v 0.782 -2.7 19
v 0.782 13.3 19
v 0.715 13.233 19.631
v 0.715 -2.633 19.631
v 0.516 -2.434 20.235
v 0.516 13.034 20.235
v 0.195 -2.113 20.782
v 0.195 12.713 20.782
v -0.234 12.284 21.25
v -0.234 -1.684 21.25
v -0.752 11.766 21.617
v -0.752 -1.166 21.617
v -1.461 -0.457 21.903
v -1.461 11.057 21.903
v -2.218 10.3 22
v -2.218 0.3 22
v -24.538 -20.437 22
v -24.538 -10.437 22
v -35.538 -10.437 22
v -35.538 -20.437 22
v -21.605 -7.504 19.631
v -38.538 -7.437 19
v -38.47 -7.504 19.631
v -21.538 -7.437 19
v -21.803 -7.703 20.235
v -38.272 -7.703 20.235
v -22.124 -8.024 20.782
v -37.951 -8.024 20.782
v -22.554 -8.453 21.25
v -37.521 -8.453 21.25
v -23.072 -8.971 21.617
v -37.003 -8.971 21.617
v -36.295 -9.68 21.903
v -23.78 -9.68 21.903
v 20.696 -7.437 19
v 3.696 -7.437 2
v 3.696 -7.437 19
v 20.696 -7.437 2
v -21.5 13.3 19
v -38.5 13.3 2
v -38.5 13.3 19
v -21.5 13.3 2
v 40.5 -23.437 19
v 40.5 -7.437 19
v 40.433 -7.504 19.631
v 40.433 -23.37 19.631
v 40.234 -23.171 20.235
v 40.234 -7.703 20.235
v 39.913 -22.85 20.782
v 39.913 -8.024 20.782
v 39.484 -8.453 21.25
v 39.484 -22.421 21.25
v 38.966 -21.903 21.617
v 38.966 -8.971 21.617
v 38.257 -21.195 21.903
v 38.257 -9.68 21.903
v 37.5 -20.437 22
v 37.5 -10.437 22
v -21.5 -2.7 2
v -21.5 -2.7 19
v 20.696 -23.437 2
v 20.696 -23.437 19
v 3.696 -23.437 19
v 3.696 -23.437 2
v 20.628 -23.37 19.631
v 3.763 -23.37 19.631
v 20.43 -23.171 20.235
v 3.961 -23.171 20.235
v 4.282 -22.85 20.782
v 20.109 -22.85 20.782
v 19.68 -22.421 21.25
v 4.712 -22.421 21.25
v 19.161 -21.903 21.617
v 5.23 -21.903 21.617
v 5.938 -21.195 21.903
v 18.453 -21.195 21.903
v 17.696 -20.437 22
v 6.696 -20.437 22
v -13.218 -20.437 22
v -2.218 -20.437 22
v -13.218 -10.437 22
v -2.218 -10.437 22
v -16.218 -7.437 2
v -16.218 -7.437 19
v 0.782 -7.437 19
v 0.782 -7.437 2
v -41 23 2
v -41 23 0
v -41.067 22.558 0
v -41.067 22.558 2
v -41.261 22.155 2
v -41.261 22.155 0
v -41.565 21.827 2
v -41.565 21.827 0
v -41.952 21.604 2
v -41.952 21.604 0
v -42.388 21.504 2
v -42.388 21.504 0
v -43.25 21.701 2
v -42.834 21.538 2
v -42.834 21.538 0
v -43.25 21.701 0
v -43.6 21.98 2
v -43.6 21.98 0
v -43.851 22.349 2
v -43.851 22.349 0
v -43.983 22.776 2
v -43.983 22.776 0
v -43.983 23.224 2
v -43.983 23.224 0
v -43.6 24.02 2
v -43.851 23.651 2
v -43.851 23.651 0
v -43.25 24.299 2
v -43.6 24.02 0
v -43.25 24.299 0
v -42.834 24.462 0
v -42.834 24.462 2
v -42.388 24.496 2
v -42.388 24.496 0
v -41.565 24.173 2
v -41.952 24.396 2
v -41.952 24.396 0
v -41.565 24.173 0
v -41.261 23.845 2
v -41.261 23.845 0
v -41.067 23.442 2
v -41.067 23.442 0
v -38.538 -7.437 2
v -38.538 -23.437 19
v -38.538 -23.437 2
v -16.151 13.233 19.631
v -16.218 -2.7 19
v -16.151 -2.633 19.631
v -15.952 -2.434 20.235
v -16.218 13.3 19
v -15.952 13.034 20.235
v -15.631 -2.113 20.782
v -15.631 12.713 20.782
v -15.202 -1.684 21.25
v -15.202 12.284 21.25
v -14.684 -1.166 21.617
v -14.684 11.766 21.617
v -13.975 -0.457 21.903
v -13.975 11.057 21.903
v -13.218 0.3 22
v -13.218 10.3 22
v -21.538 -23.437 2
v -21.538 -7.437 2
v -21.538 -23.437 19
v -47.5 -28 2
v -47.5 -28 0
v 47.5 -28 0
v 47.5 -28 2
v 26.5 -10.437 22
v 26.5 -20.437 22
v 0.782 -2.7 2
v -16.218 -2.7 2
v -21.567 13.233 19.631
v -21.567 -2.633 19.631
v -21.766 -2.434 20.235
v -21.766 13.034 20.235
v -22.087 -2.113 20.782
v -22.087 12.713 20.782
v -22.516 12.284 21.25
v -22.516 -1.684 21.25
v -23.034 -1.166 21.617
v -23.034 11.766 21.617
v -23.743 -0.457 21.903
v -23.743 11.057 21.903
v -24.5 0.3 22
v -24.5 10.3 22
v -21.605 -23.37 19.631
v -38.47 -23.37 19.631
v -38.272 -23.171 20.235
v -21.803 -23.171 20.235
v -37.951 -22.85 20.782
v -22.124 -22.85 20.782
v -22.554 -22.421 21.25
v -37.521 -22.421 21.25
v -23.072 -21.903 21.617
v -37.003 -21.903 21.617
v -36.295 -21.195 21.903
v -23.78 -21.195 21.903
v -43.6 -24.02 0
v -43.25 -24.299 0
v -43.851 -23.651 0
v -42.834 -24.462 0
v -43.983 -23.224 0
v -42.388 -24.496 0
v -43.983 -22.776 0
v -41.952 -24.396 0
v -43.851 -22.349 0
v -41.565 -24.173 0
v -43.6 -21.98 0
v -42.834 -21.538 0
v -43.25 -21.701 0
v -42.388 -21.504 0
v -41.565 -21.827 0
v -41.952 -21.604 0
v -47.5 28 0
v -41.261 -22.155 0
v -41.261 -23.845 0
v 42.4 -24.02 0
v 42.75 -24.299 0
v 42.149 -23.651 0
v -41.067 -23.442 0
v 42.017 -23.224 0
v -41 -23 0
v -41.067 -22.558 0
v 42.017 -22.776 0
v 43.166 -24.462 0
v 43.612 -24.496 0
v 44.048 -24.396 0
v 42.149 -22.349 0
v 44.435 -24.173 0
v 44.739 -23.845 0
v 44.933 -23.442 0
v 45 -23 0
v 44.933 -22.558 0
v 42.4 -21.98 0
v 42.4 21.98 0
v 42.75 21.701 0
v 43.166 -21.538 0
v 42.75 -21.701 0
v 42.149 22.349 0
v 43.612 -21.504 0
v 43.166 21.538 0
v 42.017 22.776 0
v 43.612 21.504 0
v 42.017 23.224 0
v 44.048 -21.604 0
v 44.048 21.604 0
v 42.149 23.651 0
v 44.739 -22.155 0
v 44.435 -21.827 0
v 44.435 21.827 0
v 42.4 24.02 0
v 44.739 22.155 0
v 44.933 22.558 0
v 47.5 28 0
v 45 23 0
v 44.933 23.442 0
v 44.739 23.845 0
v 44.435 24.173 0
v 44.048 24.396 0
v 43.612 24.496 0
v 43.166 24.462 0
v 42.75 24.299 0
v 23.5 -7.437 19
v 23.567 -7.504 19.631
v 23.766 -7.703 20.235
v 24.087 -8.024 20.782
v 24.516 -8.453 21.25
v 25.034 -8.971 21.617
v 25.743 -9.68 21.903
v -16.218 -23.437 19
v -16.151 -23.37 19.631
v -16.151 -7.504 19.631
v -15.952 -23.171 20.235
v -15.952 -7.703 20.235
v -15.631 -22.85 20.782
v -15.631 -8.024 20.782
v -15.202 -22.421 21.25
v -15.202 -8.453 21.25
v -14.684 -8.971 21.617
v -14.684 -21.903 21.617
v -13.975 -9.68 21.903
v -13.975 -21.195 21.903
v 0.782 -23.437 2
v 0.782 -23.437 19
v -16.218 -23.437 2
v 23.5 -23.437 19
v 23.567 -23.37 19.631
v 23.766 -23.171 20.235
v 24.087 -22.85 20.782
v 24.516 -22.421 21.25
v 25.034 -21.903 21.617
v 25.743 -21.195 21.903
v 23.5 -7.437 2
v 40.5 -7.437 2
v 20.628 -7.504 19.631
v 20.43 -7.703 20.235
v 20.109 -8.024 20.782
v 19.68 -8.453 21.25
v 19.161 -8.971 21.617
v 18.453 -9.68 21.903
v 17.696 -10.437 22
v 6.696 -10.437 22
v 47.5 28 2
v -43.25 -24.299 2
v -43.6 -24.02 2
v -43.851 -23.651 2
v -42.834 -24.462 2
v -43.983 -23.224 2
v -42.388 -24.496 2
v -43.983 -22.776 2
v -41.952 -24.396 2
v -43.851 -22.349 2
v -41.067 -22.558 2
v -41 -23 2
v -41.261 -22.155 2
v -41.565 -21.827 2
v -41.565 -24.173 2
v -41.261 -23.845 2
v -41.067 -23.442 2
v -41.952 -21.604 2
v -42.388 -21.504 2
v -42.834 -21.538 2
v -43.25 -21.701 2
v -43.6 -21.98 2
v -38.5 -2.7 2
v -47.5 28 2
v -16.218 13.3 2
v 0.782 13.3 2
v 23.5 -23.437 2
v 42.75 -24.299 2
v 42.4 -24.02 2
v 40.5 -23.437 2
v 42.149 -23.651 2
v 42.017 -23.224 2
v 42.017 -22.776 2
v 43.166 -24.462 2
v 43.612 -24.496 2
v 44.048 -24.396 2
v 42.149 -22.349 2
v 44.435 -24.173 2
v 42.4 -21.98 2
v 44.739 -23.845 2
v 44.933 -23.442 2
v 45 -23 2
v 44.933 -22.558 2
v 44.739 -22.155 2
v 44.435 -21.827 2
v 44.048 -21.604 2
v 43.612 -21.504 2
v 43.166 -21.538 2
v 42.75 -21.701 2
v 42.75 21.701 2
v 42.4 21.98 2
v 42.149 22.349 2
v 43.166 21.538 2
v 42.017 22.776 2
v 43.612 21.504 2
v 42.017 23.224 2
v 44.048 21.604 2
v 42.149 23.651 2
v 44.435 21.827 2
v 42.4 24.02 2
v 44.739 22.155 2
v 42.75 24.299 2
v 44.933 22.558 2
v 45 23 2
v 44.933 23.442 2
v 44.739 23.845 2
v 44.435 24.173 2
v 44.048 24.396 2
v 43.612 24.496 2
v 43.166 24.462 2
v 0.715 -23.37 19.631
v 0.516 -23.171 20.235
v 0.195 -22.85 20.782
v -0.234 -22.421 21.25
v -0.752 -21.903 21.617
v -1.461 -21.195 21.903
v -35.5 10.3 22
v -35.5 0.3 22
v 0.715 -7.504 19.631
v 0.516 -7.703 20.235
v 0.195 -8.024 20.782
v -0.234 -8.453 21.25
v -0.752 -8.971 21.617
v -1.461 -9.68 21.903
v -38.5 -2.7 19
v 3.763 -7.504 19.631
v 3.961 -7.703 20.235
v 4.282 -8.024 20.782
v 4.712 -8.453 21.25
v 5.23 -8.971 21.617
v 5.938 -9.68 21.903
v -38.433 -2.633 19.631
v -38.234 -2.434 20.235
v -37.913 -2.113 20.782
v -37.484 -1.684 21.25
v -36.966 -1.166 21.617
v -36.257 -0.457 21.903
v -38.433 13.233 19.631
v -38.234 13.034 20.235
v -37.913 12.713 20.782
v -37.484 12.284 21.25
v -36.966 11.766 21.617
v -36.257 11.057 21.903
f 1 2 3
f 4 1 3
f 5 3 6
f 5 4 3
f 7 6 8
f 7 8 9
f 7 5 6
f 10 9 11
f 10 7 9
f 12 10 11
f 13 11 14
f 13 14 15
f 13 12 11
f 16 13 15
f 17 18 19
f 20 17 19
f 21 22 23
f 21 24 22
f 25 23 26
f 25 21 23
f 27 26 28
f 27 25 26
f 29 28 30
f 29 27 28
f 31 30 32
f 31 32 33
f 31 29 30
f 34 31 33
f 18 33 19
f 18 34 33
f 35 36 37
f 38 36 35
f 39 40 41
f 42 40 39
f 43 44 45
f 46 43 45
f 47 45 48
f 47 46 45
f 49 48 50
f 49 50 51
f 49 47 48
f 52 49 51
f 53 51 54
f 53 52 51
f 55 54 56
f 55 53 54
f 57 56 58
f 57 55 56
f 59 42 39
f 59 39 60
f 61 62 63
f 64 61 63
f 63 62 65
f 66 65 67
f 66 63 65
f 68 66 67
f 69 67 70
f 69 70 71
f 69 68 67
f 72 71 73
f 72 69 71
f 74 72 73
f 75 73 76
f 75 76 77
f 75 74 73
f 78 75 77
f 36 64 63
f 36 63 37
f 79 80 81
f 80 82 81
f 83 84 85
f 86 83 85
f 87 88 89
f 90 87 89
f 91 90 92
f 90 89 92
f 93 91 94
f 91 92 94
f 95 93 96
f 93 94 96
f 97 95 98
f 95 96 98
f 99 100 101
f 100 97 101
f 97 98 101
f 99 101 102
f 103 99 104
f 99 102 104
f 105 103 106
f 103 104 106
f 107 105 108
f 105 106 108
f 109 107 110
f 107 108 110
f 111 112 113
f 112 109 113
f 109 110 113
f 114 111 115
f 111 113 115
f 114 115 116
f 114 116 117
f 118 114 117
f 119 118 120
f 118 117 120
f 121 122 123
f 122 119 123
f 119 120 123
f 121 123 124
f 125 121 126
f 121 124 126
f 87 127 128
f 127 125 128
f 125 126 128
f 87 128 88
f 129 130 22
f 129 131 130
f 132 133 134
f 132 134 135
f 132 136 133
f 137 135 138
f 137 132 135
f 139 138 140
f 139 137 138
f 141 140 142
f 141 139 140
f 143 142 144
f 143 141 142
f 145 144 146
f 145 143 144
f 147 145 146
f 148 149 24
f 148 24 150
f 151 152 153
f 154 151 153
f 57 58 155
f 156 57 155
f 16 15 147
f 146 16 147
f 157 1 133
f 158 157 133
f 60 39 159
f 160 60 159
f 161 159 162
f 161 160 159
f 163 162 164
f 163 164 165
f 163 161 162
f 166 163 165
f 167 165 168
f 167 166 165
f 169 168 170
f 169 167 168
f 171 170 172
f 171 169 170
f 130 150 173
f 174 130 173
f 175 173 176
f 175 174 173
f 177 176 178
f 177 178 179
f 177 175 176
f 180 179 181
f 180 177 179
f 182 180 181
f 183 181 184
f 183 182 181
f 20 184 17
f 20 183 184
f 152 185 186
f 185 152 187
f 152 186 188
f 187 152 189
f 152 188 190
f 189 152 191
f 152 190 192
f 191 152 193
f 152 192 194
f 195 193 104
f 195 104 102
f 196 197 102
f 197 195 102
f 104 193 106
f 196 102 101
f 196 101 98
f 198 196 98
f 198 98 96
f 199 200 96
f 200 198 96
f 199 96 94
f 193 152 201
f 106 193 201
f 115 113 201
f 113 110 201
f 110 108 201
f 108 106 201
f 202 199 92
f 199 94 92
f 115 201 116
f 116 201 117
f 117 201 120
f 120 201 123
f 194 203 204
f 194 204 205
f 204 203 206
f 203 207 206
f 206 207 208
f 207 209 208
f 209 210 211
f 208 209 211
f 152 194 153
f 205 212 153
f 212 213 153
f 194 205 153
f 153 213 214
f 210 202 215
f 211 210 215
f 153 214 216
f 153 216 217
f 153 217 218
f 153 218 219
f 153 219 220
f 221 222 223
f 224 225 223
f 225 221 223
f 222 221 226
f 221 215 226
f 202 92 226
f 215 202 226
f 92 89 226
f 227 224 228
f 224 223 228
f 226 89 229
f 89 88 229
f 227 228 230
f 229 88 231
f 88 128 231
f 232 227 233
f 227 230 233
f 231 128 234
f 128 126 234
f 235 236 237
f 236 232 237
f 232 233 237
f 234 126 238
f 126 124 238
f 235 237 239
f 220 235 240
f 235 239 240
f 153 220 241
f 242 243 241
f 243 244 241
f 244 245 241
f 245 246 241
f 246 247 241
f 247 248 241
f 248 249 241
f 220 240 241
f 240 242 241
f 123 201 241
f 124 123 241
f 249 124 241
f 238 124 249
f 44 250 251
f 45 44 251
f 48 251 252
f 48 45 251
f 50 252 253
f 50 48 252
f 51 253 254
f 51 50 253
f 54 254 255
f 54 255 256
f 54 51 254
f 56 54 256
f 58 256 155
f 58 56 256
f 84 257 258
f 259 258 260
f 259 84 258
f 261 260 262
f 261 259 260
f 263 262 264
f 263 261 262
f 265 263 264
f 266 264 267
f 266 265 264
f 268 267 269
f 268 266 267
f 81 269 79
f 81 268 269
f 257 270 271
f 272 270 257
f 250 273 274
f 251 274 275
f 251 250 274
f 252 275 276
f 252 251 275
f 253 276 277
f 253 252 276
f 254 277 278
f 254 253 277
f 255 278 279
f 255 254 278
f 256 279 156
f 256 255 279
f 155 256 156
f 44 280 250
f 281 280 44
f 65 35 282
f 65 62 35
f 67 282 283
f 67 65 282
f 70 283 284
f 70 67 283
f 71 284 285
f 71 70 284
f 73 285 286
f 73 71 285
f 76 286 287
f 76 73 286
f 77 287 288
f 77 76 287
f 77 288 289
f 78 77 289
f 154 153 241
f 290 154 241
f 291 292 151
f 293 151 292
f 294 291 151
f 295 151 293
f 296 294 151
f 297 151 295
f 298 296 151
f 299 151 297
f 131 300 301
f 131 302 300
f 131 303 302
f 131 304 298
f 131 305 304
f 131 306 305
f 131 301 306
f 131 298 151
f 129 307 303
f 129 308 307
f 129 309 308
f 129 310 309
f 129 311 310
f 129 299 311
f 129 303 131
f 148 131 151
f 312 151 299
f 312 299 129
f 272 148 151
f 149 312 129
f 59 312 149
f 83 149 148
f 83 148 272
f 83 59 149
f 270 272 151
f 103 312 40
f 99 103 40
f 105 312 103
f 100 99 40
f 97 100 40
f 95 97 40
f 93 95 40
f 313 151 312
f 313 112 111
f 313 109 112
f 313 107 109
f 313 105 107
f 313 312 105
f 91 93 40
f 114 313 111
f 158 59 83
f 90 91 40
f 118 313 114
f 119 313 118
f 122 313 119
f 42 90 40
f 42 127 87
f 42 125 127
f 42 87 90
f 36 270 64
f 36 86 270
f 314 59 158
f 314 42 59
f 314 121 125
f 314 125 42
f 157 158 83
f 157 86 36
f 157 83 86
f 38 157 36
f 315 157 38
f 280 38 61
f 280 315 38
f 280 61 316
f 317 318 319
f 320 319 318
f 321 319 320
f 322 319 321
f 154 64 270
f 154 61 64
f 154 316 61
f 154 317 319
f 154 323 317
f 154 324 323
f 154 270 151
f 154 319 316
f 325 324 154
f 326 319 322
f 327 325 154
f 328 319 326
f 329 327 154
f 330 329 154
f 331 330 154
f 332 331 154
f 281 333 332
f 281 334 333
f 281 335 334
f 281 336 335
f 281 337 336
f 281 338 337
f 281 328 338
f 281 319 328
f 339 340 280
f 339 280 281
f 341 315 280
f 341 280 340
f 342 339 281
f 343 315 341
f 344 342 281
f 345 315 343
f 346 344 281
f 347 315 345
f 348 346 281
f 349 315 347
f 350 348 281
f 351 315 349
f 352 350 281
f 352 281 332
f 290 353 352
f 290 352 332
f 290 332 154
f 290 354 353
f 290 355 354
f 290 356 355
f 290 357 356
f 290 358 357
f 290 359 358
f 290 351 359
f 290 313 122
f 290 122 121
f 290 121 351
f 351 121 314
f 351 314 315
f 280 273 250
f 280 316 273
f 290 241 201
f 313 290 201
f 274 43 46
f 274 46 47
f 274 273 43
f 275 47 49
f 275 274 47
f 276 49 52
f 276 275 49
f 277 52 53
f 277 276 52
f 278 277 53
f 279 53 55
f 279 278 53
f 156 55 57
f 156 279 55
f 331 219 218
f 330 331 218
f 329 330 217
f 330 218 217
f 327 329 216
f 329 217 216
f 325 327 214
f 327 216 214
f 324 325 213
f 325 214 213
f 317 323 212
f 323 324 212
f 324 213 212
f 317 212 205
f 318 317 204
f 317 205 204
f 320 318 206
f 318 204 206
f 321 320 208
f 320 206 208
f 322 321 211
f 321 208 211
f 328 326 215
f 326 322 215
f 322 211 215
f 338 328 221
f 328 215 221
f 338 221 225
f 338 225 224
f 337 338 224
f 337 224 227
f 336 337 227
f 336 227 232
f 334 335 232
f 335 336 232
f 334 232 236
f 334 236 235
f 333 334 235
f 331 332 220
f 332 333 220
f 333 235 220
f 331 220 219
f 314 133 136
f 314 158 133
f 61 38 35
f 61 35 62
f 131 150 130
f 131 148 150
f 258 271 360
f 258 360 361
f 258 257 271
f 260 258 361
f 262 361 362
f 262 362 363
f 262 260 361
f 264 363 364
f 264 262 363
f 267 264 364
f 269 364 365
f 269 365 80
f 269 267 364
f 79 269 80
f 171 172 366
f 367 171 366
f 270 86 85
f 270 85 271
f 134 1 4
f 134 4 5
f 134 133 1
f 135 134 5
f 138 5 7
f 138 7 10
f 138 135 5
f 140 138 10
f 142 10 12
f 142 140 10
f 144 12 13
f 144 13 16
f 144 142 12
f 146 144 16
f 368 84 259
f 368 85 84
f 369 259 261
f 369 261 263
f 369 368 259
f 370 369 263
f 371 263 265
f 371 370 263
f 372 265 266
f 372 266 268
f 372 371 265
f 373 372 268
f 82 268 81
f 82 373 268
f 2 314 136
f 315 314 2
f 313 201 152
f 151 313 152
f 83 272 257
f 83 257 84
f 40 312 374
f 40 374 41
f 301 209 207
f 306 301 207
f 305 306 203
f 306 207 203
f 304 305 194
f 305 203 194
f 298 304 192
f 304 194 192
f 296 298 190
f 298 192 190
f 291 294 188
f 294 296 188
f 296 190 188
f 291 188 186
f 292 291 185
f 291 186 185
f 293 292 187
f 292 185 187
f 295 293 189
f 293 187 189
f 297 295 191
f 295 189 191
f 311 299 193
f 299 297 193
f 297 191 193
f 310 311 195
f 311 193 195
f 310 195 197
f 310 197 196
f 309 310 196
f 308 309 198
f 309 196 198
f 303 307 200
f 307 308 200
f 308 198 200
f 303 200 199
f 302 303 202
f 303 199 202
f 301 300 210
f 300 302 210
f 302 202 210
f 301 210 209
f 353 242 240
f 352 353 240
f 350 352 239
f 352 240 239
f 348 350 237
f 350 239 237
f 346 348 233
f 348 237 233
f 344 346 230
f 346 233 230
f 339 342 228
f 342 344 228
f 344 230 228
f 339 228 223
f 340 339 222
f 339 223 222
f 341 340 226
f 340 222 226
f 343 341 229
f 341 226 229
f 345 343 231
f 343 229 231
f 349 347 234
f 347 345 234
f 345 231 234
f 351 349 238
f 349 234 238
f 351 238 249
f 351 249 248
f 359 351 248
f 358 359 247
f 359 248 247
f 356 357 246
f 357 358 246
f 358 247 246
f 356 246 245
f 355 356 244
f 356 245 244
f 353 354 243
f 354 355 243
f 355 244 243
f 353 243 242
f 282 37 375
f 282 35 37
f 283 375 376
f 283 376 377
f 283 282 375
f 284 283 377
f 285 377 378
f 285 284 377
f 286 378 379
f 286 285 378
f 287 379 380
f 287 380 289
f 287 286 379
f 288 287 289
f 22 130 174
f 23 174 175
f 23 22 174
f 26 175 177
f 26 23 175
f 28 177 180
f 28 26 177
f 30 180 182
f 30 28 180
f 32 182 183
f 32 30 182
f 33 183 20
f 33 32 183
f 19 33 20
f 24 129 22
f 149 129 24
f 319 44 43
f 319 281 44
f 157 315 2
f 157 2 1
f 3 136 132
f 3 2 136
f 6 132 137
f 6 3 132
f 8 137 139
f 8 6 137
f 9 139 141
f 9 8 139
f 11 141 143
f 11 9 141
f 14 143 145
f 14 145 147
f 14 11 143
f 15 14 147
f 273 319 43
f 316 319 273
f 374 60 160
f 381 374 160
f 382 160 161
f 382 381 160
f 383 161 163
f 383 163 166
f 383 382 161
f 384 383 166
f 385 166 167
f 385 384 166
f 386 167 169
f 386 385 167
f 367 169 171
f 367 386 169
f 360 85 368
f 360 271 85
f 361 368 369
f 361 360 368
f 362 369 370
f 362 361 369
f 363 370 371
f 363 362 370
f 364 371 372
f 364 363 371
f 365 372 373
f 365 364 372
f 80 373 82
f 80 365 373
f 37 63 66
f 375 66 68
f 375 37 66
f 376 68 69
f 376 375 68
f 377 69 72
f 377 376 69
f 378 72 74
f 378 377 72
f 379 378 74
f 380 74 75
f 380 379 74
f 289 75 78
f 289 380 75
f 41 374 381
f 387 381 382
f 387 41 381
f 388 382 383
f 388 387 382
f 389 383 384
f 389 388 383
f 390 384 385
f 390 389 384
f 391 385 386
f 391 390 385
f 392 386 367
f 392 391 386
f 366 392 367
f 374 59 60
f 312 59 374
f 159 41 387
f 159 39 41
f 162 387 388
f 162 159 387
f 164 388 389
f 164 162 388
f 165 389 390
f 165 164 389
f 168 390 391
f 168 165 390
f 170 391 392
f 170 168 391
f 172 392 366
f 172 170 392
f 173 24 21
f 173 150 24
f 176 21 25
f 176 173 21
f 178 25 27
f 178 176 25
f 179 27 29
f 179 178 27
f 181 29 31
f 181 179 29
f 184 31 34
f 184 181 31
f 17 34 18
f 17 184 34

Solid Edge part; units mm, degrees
sketch "Sketch1" plane through (0, 0, 0) normal (0, 0, 1) x (1, 0, 0)
  line L0 (-47.5, 28) -> (-47.5, -28)
  line L1 (-47.5, -28) -> (47.5, -28)
  line L2 (47.5, -28) -> (47.5, 28)
  line L3 (47.5, 28) -> (-47.5, 28)
  circle A0 centre (-42.5, 23) radius 1.5
  circle A1 centre (-42.5, -23) radius 1.5
  circle A2 centre (43.5, -23) radius 1.5
  circle A3 centre (43.5, 23) radius 1.5
  dimension "D1" = 95
  dimension "D2" = 56
  dimension "D3" = 5
  dimension "D4" = 5
  dimension "D5" = 5
  dimension "D6" = 4
  dimension "D7" = 4
  dimension "D8" = 5
  dimension "D9" = 5
  dimension "D10" = 46
  dimension "D11" = 46
  dimension "D12" = 5
extrude "Protrusion1" add sketch "Sketch1" along normal blind 2
sketch "Sketch2" plane through (0, 0, 0) normal (0, 0, -1) x (1, 0, 0)
  line L0 (-21.5, -13.3) -> (-21.5, 2.7)
  line L1 (-21.5, 2.7) -> (-38.5, 2.7)
  line L2 (-38.5, 2.7) -> (-38.5, -13.3)
  line L3 (-38.5, -13.3) -> (-21.5, -13.3)
  line L4 (-16.218, 2.7) -> (-16.218, -13.3)
  line L5 (-16.218, -13.3) -> (0.782, -13.3)
  line L6 (0.782, -13.3) -> (0.782, 2.7)
  line L7 (0.782, 2.7) -> (-16.218, 2.7)
  line L8 (3.6956, 23.4371) -> (3.6956, 7.4371)
  line L9 (3.6956, 7.4371) -> (20.6956, 7.4371)
  line L10 (20.6956, 7.4371) -> (20.6956, 23.4371)
  line L11 (20.6956, 23.4371) -> (3.6956, 23.4371)
  line L12 (23.5, 23.4371) -> (23.5, 7.4371)
  line L13 (23.5, 7.4371) -> (40.5, 7.4371)
  line L14 (40.5, 7.4371) -> (40.5, 23.4371)
  line L15 (40.5, 23.4371) -> (23.5, 23.4371)
  line L16 (-38.5375, 23.4371) -> (-38.5375, 7.4371)
  line L17 (-38.5375, 7.4371) -> (-21.5375, 7.4371)
  line L18 (-21.5375, 7.4371) -> (-21.5375, 23.4371)
  line L19 (-21.5375, 23.4371) -> (-38.5375, 23.4371)
  line L20 (-16.218, 23.4371) -> (-16.218, 7.4371)
  line L21 (-16.218, 7.4371) -> (0.782, 7.4371)
  line L22 (0.782, 7.4371) -> (0.782, 23.4371)
  line L23 (0.782, 23.4371) -> (-16.218, 23.4371)
  dimension "D1" = 17
  dimension "D2" = 16
  dimension "D3" = 3
  dimension "D4" = 4
  dimension "D5" = 17
  dimension "D6" = 16
  dimension "D7" = 17
  dimension "D8" = 16
  dimension "D9" = 16
  dimension "D10" = 17
  dimension "D11" = 16
  dimension "D12" = 14.7
extrude "ExtrudedProtrusion_2" add sketch "Sketch2" against normal blind 22
fillet "Round_1" radius 3 24 edges at (-38.5, 5.3, 22) (-30, -2.7, 22) (-21.5, 5.3, 22) (-16.218, 5.3, 22) (-30, 13.3, 22) (-7.718, -2.7, 22) (0.782, 5.3, 22) (-7.718, 13.3, 22) (-38.5375, -15.4371, 22) (-30.0375, -23.4371, 22) (-21.5375, -15.4371, 22) (-30.0375, -7.4371, 22) (-16.218, -15.4371, 22) (-7.718, -7.4371, 22) (-7.718, -23.4371, 22) (0.782, -15.4371, 22) (3.6956, -15.4371, 22) (12.1956, -23.4371, 22) (12.1956, -7.4371, 22) (20.6956, -15.4371, 22) (23.5, -15.4371, 22) (32, -23.4371, 22) (40.5, -15.4371, 22) (32, -7.4371, 22)
